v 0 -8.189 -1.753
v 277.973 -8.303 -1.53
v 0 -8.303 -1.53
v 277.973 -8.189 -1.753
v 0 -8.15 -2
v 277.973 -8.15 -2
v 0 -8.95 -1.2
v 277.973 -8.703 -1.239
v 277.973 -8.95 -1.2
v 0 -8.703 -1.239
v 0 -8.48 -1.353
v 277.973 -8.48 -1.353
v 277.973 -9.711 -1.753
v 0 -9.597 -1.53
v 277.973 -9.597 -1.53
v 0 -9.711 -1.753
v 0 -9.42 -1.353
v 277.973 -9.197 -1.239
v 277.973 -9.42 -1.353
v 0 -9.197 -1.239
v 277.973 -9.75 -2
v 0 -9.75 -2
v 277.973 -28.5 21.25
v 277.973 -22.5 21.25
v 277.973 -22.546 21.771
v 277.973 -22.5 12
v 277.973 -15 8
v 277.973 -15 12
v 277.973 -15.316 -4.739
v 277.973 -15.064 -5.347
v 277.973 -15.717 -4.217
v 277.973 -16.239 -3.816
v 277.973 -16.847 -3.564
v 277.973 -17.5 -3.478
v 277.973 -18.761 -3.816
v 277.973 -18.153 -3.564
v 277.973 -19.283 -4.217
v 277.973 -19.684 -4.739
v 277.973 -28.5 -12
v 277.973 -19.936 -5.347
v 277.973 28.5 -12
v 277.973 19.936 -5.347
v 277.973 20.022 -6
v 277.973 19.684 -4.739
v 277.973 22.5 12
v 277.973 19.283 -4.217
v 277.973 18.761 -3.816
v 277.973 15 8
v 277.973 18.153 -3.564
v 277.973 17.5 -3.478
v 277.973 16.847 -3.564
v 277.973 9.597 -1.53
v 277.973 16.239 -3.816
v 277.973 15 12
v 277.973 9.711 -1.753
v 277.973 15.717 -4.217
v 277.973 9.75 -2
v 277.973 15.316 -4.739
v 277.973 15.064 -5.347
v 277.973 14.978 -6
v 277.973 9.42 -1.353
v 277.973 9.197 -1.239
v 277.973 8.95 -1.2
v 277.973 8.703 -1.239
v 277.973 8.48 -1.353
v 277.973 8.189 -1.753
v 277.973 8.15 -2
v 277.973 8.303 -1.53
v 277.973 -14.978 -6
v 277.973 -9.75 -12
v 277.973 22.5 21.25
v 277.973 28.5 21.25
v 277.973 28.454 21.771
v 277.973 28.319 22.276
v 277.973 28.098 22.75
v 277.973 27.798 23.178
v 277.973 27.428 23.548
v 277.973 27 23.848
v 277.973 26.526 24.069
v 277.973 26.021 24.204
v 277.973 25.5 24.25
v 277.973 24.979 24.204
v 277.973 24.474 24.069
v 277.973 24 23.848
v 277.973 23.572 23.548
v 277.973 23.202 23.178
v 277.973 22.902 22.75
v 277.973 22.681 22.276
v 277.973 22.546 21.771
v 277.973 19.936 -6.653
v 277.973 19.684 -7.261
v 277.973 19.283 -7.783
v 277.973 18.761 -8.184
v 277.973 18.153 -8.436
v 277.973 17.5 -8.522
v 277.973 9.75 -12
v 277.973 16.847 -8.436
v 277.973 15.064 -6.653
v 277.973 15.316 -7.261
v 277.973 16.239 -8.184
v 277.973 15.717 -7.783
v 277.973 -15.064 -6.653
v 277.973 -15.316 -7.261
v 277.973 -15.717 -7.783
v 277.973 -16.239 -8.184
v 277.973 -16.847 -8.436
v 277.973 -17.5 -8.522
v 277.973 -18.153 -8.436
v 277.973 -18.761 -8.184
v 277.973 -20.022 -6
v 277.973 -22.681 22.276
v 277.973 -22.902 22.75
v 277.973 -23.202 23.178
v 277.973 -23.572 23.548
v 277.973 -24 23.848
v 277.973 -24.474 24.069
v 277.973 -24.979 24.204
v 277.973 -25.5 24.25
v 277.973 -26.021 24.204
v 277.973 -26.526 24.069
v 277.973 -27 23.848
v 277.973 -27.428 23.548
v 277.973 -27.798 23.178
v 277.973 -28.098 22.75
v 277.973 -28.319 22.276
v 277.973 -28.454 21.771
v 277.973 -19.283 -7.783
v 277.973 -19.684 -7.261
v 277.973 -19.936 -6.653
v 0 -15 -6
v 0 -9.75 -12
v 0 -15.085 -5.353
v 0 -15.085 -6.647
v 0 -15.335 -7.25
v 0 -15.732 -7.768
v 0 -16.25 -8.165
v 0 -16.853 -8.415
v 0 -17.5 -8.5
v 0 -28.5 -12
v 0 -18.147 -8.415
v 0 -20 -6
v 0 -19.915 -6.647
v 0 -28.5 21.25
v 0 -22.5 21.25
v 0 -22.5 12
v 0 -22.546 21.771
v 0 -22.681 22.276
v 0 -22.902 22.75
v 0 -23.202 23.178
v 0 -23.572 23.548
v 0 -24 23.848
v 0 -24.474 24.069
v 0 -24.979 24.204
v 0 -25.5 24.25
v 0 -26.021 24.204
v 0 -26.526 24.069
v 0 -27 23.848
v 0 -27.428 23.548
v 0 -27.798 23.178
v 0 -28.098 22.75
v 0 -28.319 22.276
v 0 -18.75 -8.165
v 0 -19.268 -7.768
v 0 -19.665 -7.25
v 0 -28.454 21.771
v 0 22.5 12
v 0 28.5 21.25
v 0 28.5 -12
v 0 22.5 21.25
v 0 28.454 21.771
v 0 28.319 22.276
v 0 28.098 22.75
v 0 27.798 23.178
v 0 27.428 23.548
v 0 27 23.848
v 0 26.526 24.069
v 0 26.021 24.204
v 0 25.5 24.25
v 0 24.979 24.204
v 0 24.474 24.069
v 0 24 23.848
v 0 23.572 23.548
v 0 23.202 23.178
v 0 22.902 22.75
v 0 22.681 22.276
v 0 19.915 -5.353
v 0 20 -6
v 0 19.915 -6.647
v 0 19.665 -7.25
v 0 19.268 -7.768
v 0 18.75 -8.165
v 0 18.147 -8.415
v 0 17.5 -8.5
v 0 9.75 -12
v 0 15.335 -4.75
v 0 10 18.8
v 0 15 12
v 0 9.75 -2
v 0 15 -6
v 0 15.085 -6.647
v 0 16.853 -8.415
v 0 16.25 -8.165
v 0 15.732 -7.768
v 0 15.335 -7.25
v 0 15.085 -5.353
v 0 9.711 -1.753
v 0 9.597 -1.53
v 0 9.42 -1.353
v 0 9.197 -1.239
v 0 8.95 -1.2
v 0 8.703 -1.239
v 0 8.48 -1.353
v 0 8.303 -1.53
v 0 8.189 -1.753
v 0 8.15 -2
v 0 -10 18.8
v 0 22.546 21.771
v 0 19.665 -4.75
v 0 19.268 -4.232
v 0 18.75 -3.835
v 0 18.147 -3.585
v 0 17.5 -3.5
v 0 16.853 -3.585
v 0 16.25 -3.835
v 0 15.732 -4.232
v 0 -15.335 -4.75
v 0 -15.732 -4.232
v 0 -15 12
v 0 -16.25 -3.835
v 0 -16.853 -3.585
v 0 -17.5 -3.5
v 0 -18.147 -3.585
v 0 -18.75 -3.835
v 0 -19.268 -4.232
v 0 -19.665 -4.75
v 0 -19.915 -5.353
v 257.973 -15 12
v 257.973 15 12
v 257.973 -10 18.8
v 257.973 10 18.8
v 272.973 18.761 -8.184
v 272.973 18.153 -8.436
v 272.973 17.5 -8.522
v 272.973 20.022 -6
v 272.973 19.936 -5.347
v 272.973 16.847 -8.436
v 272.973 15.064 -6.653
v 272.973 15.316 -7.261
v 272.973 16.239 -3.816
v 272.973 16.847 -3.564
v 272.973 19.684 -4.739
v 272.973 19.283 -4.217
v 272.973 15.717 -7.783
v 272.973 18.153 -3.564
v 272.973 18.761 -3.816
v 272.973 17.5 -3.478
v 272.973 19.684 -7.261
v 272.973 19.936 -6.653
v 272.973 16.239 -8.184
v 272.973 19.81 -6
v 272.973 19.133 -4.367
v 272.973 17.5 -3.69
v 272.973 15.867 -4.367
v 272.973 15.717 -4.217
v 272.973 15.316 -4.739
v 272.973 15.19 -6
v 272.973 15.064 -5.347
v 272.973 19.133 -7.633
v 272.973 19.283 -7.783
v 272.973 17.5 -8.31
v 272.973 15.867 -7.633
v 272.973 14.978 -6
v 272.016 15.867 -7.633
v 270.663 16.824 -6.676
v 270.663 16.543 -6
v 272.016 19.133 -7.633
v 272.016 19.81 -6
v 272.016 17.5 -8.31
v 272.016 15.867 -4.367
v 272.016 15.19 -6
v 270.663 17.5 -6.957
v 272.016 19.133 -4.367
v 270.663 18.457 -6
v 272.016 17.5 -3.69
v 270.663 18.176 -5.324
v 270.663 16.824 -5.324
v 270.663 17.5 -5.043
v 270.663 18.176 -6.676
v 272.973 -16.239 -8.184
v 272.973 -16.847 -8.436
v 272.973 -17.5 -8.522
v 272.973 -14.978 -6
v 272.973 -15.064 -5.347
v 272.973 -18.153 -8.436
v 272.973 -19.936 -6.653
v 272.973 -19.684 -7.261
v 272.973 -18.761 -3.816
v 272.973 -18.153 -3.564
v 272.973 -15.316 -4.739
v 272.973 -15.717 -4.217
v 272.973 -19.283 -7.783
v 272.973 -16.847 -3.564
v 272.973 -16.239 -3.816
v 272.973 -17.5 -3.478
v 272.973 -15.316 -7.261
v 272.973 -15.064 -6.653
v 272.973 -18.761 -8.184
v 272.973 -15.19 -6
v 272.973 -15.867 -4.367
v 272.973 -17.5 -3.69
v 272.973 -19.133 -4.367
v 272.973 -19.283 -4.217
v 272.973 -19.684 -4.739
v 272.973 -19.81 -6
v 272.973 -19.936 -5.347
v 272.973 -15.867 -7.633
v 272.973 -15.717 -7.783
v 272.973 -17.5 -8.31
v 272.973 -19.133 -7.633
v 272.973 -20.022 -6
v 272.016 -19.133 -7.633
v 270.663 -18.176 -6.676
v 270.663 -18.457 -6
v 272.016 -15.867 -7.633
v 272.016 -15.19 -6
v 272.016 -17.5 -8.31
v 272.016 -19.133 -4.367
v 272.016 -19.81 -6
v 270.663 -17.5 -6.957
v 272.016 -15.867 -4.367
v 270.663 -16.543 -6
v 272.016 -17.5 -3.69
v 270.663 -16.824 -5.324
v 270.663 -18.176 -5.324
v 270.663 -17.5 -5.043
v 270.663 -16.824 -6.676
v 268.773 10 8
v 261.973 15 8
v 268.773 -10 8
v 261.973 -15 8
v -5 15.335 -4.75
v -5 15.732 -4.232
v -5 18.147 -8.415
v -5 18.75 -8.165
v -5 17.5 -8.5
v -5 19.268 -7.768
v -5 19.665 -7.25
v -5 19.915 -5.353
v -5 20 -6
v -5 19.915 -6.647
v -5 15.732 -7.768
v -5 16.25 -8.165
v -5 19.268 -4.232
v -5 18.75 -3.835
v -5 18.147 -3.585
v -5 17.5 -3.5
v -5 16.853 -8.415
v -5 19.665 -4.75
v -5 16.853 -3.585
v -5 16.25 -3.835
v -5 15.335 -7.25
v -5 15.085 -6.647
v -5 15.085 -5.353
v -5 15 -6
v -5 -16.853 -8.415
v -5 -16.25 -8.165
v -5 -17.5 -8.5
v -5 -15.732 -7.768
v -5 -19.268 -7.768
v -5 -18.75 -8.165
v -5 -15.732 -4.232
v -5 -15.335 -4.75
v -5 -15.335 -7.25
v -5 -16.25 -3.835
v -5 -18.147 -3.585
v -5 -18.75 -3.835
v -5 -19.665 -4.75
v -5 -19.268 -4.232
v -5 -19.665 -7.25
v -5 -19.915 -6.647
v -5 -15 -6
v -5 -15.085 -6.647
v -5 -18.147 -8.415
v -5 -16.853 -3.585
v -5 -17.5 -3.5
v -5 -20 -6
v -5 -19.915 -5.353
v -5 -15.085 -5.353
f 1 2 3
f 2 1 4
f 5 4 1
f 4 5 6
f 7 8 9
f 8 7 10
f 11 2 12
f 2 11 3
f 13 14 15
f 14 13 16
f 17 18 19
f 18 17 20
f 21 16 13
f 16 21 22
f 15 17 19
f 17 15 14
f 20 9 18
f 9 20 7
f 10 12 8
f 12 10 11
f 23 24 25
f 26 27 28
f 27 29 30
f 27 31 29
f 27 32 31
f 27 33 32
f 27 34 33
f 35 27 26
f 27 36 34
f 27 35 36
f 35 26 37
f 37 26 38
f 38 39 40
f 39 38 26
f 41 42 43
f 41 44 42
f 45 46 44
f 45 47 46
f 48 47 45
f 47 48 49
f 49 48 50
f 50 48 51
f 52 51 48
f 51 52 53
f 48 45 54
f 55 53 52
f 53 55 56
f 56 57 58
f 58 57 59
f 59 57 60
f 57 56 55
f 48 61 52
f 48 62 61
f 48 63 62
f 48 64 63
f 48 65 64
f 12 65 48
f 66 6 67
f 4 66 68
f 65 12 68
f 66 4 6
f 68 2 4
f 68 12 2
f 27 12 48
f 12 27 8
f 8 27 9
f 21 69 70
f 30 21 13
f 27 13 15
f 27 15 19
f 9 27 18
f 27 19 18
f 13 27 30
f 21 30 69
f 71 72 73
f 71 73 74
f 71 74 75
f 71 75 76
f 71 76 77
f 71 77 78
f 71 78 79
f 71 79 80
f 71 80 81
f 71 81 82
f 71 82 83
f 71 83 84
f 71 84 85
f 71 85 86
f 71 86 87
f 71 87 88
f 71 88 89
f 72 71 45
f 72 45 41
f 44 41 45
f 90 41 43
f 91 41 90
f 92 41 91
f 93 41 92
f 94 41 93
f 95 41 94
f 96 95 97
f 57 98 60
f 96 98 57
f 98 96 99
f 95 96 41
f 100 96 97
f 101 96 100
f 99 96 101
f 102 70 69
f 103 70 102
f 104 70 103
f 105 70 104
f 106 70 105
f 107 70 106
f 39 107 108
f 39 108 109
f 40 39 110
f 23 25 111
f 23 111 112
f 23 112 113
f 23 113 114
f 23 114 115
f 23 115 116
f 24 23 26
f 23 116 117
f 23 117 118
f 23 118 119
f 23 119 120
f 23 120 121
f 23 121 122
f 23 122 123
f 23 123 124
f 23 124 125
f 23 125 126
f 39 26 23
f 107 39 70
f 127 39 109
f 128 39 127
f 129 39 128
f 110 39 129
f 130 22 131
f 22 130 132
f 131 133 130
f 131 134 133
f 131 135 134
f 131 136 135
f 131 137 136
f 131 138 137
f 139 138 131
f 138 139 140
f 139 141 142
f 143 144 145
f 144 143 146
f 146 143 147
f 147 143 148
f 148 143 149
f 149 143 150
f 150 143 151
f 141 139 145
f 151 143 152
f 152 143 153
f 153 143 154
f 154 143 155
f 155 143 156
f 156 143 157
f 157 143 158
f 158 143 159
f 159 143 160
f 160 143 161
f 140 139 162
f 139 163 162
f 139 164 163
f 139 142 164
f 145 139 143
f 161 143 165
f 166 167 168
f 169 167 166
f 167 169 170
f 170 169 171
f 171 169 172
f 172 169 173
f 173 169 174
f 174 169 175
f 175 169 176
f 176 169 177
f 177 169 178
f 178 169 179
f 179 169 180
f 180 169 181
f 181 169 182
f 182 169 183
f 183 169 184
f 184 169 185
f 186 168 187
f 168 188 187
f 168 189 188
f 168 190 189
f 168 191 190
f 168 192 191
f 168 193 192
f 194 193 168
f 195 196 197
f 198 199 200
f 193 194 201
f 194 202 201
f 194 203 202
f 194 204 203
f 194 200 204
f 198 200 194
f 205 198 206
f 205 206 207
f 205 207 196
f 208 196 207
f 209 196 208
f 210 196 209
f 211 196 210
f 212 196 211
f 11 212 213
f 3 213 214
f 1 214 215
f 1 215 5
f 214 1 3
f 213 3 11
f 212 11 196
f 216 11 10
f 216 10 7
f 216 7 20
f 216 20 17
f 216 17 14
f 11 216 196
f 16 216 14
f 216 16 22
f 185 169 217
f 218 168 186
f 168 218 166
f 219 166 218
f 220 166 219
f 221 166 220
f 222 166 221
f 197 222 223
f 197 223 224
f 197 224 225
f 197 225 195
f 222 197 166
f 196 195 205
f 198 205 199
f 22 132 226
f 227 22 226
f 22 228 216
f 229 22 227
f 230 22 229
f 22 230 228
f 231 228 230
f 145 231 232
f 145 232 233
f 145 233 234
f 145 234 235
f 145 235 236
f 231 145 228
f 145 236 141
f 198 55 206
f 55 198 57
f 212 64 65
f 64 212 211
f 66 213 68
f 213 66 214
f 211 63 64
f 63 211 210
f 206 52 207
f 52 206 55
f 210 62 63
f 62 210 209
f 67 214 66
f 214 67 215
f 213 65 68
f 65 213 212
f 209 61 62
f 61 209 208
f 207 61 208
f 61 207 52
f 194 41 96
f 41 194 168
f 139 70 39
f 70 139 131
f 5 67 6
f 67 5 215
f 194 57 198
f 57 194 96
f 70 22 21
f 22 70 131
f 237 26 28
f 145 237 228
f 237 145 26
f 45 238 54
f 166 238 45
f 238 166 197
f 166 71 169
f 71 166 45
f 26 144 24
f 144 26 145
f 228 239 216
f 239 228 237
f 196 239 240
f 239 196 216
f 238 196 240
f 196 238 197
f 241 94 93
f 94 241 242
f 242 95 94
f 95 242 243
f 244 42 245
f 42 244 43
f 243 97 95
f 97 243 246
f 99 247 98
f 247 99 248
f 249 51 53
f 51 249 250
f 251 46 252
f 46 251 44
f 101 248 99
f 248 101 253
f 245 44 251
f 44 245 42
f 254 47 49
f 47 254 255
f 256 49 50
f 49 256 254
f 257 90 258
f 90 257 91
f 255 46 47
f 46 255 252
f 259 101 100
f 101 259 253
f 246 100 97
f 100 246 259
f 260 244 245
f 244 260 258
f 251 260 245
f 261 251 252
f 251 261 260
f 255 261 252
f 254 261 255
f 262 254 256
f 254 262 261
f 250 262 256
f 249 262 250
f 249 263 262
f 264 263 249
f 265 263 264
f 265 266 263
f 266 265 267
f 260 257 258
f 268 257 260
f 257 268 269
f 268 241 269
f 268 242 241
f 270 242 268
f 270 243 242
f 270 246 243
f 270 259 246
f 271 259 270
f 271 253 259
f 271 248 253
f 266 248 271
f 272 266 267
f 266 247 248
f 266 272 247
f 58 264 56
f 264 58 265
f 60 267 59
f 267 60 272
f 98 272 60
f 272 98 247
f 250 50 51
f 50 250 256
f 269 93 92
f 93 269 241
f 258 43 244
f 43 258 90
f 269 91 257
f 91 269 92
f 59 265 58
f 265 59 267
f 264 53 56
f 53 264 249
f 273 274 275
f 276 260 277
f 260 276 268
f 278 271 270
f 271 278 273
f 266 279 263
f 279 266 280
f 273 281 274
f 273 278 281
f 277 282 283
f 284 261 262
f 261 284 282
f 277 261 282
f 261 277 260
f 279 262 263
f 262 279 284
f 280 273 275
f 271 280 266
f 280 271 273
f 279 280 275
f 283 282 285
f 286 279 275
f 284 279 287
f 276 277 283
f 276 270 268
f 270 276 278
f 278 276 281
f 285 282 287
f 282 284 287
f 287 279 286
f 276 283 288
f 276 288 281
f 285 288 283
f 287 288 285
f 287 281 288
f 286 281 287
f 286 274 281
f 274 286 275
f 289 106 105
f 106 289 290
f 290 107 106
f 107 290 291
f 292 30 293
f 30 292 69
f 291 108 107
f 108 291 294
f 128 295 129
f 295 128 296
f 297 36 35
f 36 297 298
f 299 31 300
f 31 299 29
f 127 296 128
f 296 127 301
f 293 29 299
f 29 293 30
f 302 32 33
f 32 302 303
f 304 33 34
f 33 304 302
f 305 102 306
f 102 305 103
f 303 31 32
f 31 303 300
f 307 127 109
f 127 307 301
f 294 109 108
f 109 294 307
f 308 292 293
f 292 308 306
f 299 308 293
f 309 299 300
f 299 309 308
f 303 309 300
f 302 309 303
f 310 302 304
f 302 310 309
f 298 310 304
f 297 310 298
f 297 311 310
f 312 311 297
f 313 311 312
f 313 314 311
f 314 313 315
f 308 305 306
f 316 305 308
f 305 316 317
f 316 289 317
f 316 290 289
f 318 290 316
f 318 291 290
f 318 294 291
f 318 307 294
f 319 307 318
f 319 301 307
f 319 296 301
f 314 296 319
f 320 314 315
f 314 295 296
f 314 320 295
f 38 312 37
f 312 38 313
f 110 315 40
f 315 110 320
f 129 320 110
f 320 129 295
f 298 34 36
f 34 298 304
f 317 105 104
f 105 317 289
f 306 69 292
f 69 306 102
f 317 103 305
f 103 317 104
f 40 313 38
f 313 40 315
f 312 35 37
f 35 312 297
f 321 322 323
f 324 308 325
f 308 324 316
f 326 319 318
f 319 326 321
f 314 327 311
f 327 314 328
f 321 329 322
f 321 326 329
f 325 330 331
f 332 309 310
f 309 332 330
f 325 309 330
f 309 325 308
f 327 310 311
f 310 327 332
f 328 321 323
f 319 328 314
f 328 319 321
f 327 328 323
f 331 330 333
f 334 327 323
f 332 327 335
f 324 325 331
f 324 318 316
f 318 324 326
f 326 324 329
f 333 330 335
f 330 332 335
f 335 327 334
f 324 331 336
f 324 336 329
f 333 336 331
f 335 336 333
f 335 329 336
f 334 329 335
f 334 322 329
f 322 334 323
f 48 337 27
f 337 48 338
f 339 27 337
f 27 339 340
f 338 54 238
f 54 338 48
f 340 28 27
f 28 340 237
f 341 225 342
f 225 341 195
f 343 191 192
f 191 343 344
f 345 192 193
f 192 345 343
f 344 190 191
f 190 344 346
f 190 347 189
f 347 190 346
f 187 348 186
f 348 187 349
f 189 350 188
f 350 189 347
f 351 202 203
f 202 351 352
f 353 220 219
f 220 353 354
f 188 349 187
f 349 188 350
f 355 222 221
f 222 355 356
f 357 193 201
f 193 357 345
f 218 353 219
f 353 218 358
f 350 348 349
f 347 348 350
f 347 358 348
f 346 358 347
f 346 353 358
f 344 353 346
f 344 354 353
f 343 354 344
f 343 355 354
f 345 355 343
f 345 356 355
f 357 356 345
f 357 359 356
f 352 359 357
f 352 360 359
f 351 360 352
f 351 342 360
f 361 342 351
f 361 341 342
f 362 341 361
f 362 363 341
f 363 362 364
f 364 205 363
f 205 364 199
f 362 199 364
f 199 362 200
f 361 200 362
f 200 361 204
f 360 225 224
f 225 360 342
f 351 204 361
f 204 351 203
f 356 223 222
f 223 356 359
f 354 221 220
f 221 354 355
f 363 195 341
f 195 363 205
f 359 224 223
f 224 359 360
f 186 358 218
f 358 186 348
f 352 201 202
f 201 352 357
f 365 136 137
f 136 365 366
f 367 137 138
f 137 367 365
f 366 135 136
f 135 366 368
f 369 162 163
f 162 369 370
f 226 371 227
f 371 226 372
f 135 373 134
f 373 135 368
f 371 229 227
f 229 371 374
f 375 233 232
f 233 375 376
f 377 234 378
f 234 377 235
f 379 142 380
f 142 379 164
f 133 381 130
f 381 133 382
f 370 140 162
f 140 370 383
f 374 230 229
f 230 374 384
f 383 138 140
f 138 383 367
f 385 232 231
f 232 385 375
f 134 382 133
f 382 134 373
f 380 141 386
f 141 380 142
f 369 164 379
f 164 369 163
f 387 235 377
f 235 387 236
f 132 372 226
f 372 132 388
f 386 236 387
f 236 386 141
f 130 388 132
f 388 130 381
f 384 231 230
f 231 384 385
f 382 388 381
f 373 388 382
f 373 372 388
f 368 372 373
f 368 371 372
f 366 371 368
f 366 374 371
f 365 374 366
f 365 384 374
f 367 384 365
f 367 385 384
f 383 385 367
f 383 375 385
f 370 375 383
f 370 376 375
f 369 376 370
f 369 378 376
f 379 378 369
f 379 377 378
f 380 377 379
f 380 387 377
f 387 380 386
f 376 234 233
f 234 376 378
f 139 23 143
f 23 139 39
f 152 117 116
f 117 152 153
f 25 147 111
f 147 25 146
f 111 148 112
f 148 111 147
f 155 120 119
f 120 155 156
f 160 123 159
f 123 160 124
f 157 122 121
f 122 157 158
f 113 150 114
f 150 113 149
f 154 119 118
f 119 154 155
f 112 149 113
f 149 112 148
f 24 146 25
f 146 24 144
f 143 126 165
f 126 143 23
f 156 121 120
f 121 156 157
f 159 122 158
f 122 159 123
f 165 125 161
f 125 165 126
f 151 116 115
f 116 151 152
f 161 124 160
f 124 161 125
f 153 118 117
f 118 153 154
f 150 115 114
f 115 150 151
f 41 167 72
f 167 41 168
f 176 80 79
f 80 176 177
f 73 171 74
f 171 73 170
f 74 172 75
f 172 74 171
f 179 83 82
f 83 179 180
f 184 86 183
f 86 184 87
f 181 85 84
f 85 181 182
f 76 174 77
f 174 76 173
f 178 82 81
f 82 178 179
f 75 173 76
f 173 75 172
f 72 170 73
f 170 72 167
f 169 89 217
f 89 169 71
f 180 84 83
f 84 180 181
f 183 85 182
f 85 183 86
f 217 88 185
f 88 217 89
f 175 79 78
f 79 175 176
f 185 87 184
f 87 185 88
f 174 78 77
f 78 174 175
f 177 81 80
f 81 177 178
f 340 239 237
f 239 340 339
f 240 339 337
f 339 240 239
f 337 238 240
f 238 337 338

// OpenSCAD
// file: bottom_bracket.scad
include <dimensions.scad> 

module screw_slot() {
  $fn=32;
  
  cylinder(h=total_height+1, d=screw_body_clearance);
  cylinder(h=total_height - screw_body_depth - screw_angle_depth, d=screw_head_clearance);
  translate([0, 0, total_height - screw_body_depth - screw_angle_depth]) {
    cylinder(h=screw_angle_depth, d1=screw_head_clearance, d2=screw_body_clearance);
  }
}

// Z should be set to the surface that is being joined to
module joiner_pins_male() {
  translate([depth/2, (hd_enclosure_width/2) - pin_diameter, 0]) {
    cylinder(d=pin_diameter, h=pin_length, $fn=24);
  }
  translate([depth/2, -((hd_enclosure_width/2) - pin_diameter), 0]) {
    cylinder(d=pin_diameter, h=pin_length, $fn=24);
  }
}

module cylinder_outer(height,radius,fn){
  fudge = 1/cos(180/fn);
  cylinder(h=height,r=radius*fudge,$fn=fn);
}

module sphere_outer(r,fn){
  fudge = 1/cos(180/fn);
  sphere(r=r*fudge,$fn=fn);
}

module octahedron(r=10) {
    polyhedron(
        points=[
            [r,0,0], [-r,0,0], [0,r,0], [0,-r,0], // Equator
            [0,0,r], [0,0,-r]                      // Poles
        ],
        faces=[
            [0,2,4], [2,1,4], [1,3,4], [3,0,4],    // Top faces
            [0,3,5], [3,1,5], [1,2,5], [2,0,5]     // Bottom faces
        ]
    );
}

module joiner_pins_female() {
  module pin() {
    cylinder_outer(radius=pin_diameter/2, height=pin_length, fn=24);
    //translate([0, 0, 0/*pin_length*/]) {
      sphere(r=pin_diameter/2, $fn=8);
      //}
  }
  
  translate([depth/2, (hd_enclosure_width/2) - pin_diameter, -pin_length]) {
    pin();
  }
  translate([depth/2, -((hd_enclosure_width/2) - pin_diameter), -pin_length]) {
    pin();
  }
}

module main_body(ts=true, h=total_height) {

  // the radius of the little fold in the PD side
  pd_enclosure_mini_radius = 0.8;
  dfloor = (ts ? seal_floor_offset : 0);
    
  difference() {

    // the floor
    translate([-dfloor, -hd_enclosure_width/2, 0]) {
      cube([dfloor + depth,hd_enclosure_width, h]);
    }

    // the carveout for the pet door side
    translate([depth - pd_enclosure_depth, -pd_enclosure_width/2, 0]) {
      cube([pd_enclosure_depth, pd_enclosure_width, h]);
      rotate([0, 0, 90]) {
        translate([pd_enclosure_mini_radius, 0, 0]){
          cylinder(r=pd_enclosure_mini_radius, h=h, $fn=20);
        }
        translate([pd_enclosure_width - pd_enclosure_mini_radius, 0, 0]) {
          cylinder(r=pd_enclosure_mini_radius, h=h, $fn=20);
        }
      }
    }
  }

  if (ts) {
    translate([-dfloor, 0, 0])
    trapezoid_seal(h=h);
  }
}

// the trapezoidal seal
module trapezoid_seal(h=total_height) {
  x0 = -seal_depth;

  y0 = -seal_small_width / 2;
  y1 = seal_small_width / 2;
  y2 = -seal_large_width / 2;
  y3 = seal_large_width / 2;
  
  linear_extrude(height=h) {
    polygon(points=[[x0, y0], [x0, y1], [0, y3], [0, y2]]);
  }
}

module track_slot() {
  l = seal_depth + depth + seal_floor_offset;
  
  translate([-(seal_depth + seal_floor_offset), 0, 0]) {
    rotate(a=[0,90,0]) {
      # cylinder(h=l, d=track_diameter, $fn=32);
    }
  }
}

module seal(h=overhang_height, l=hd_enclosure_depth + depth) {
  ri = overhang_indoor_width / 2;
  ro = overhang_outdoor_width / 2;

  // the indoor overhang
  translate([ri,
             -hd_enclosure_width/2 - overhang_indoor_width,
             track_height]) {
    cube([l-ri,
          overhang_indoor_width,
          h]);
    translate([0, ri, overhang_height-h])
      cylinder(r=ri, h=h, $fn=36);
  }

  // the outdoor overhang
  translate([ro,
             hd_enclosure_width/2,
             track_height]) {
    cube([l-ro,
          overhang_outdoor_width,
          h]);
    translate([0, ro, overhang_height-h])
      cylinder(r=ro, h=h, $fn=36);
  }
}

module seal_overhang(l=hd_enclosure_depth + depth) {
  translate([-hd_enclosure_depth, 0, 0])
    seal(l=l);
}


screw_y_offset = total_width / 4 + 1;
screw_x_offset = screw_body_clearance + 2;

module screw_slots() {
  translate([screw_x_offset, screw_y_offset, 0])
    screw_slot();
  
  translate([screw_x_offset, -screw_y_offset, 0])
    screw_slot();
}

// some little dots to help grip the petdoor side
module grippies(l=total_length) {
  grippy_radius = 0.75;
  grippy_thick = 0.3;
  grippy_angle = 45;
  
  for (x=[10, l-10, l/2]) {
    translate([x, 0, 0]) {
      /*
      translate([0, pd_enclosure_width/2, pd_enclosure_depth/2 - depth]) {
        // # sphere(r=grippy_radius, $fn=8);
        rotate([0, 90, 0])
        rotate([0, 0, 180-grippy_angle])
          cube([grippy_thick, grippy_radius, 3]);
      }
      translate([0, -pd_enclosure_width/2, pd_enclosure_depth/2 - depth]) {
        rotate([0, 90, 0])
        rotate([0, 0, grippy_angle])
          cube([grippy_thick, grippy_radius, 3]);
        // sphere(r=grippy_radius, $fn=8);
      }
      */
      translate([0, -pd_enclosure_width/2, pd_enclosure_depth/2 - depth])
        rotate([grippy_angle, 0, 0])
        cylinder(r=grippy_radius, h=grippy_thick, $fn=20);
      translate([0, pd_enclosure_width/2, pd_enclosure_depth/2 - depth])
        rotate([90, 0, 0])
        rotate([grippy_angle, 0, 0])
        cylinder(r=grippy_radius, h=grippy_thick, $fn=20);
    }
  }
}

module bottom_bracket() {
  
  seal_overhang();

  // screw_slots();

  difference() {
    main_body();
    track_slot();

    translate([0, 0, total_height-pin_length]) {
      joiner_pins_male();
    }
  }
}

// rotate([0, 180, 0])
translate([0, 0, -total_height]) bottom_bracket();
// file: dimensions.scad
//      +---------------------+
//      |                     |
//      |                     |
//      |                     |
//      |                     |
//      |                     |
//      |                     |
//      |                     |
//      |                     |
//      |                     |
//      |                     |
//   ^  |                     |
//   |  |                     |
//   Y  |                     |
//   |  |                     |
//   |  |                     |
//      +---------------------+
//       --  X (depth) --> 
// 

// the depth of the main body
depth = 12;

// the depth of the latch plate
latch_plate_depth = 3.25;

// the width of the enclosure for the human door side
hd_enclosure_width = 45;

// the depth of the enclosure for the human door side
hd_enclosure_depth = 10 * 2.5 + latch_plate_depth - 6 + 2;

// the width of the indoor overhang
overhang_indoor_width = 6;

// the width of the outdoor overhang
overhang_outdoor_width = 6;

// the total height
total_height = 290;

// the width of the enclosure for the pet door side
pd_enclosure_width = 20 - 0.5;

// the depth of the enclosure for the pet door side
pd_enclosure_depth = 10;

seal_floor_offset = 12;
seal_small_width = 20;
seal_large_width = 30;
seal_depth = 6.8;

// the height of the track inset area
track_height = 18;

// the diameter of the track
track_diameter = 7;

// the height of the overhang
overhang_height = total_height - track_height;

// the total width
total_width = hd_enclosure_width + overhang_indoor_width + overhang_outdoor_width;

screw_body_clearance = 4.5;
screw_head_clearance = 9;
screw_body_depth = 10;
screw_angle_depth = 3;

// pins
pin_diameter = 5;
pin_length = 5;

module simple_hd_seal(l=total_length) {
  // indoor HD seal
  ri = overhang_indoor_width / 2;
  
  translate([0,
             -(hd_enclosure_width/2 + overhang_indoor_width),
             -depth]) {
    cube([l,
          overhang_indoor_width,
          depth + hd_enclosure_depth - ri]);
    translate([0, overhang_indoor_width/2, hd_enclosure_depth + depth - ri])
      rotate([0, 90, 0])
      cylinder(r=ri, h=l, $fn=36);
  }

  // outdoor HD seal
  ro = overhang_outdoor_width / 2;
  
  translate([0,
             hd_enclosure_width/2,
             -depth]) {
    cube([l,
          overhang_outdoor_width,
          depth + hd_enclosure_depth - ro]);
    translate([0, overhang_indoor_width/2, hd_enclosure_depth + depth - ro])
      rotate([0, 90, 0])
      cylinder(r=ro, h=l, $fn=36);
  }
}

top_bracket_pd_expansion_length = 166;
top_bracket_pd_expansion_width = 24;
top_bracket_frame_depth = 26;

// how far the latch plate extends beyond the middle bracket
latch_plate_over_extension = 8;

// how far to penetrate the gap for the latch plate into the
// main seal floor (i.e., how deep the latch plate is relative
// to the HD surface it's attached to)
latch_plate_over_depth = 4;

// the Creality Max prints about 0.3% smaller, so if the model is
// 280mm long, it comes out to about 279mm actual
function adjust_length_error(l) = l / (1-0.0035);
// main file
include <dimensions.scad>;
use <bottom_bracket.scad>;

total_length = adjust_length_error(277);

module trapezoid_seal_ramp(l=seal_depth+seal_floor_offset) {
  x0 = 0;
  x1 = seal_floor_offset;
  x2 = (seal_depth + seal_floor_offset);

  y0 = -seal_small_width / 2;
  y1 = seal_small_width / 2;
  y2 = -seal_large_width / 2;
  y3 = seal_large_width / 2;
  y4 = -hd_enclosure_width / 2;
  y5 = hd_enclosure_width / 2;

  z0 = 0;
  z1 = (l - seal_depth);
  z2 = l;

  polyhedron(points=[[x0, y4, z0],
                     [x0, y5, z0],
                     [x1, y5, z0],
                     [x1, y3, z0],
                     [x2, y1, z0],
                     [x2, y0, z0],
                     [x1, y2, z0],
                     [x1, y4, z0],
                     [x0, y4, z1],
                     [x0, y2, z1],
                     [x0, y0, z2],
                     [x0, y1, z2],
                     [x0, y3, z1],
                     [x0, y5, z1]],
             faces=[
                    [0, 7, 8], // left side
                    [8, 7, 6, 9], // top (left)
                    [9, 6, 5, 10],
                    [10, 5, 4, 11],
                    [11, 4, 3, 12],
                    [12, 3, 2, 13], // top (right)
                    [13, 2, 1], // right side,
                    [0, 1, 2, 3, 4, 5, 6, 7], // back
                    [0, 8, 9, 10, 11, 12, 13, 1] // bottom
                    ]);
}

difference() {
  rotate([0, 90, 0])
    main_body(h=total_length);
  union() {
    translate([total_length, 0, 0])
      rotate([0, 90, 0])
      joiner_pins_female();
    translate([total_length - latch_plate_over_extension - setback,
               -seal_large_width/2,
               seal_floor_offset - latch_plate_over_depth])
    cube([latch_plate_over_extension + setback,
      seal_large_width,
      seal_depth + latch_plate_over_depth]);
  }
}
  

translate([-pin_length, 0, 0]) {
  rotate([0, 90, 0]) {
    joiner_pins_male();
  }
}

simple_hd_seal();

setback = 12;

translate([total_length - latch_plate_over_extension - setback,
           0, 0])
trapezoid_seal_ramp();
